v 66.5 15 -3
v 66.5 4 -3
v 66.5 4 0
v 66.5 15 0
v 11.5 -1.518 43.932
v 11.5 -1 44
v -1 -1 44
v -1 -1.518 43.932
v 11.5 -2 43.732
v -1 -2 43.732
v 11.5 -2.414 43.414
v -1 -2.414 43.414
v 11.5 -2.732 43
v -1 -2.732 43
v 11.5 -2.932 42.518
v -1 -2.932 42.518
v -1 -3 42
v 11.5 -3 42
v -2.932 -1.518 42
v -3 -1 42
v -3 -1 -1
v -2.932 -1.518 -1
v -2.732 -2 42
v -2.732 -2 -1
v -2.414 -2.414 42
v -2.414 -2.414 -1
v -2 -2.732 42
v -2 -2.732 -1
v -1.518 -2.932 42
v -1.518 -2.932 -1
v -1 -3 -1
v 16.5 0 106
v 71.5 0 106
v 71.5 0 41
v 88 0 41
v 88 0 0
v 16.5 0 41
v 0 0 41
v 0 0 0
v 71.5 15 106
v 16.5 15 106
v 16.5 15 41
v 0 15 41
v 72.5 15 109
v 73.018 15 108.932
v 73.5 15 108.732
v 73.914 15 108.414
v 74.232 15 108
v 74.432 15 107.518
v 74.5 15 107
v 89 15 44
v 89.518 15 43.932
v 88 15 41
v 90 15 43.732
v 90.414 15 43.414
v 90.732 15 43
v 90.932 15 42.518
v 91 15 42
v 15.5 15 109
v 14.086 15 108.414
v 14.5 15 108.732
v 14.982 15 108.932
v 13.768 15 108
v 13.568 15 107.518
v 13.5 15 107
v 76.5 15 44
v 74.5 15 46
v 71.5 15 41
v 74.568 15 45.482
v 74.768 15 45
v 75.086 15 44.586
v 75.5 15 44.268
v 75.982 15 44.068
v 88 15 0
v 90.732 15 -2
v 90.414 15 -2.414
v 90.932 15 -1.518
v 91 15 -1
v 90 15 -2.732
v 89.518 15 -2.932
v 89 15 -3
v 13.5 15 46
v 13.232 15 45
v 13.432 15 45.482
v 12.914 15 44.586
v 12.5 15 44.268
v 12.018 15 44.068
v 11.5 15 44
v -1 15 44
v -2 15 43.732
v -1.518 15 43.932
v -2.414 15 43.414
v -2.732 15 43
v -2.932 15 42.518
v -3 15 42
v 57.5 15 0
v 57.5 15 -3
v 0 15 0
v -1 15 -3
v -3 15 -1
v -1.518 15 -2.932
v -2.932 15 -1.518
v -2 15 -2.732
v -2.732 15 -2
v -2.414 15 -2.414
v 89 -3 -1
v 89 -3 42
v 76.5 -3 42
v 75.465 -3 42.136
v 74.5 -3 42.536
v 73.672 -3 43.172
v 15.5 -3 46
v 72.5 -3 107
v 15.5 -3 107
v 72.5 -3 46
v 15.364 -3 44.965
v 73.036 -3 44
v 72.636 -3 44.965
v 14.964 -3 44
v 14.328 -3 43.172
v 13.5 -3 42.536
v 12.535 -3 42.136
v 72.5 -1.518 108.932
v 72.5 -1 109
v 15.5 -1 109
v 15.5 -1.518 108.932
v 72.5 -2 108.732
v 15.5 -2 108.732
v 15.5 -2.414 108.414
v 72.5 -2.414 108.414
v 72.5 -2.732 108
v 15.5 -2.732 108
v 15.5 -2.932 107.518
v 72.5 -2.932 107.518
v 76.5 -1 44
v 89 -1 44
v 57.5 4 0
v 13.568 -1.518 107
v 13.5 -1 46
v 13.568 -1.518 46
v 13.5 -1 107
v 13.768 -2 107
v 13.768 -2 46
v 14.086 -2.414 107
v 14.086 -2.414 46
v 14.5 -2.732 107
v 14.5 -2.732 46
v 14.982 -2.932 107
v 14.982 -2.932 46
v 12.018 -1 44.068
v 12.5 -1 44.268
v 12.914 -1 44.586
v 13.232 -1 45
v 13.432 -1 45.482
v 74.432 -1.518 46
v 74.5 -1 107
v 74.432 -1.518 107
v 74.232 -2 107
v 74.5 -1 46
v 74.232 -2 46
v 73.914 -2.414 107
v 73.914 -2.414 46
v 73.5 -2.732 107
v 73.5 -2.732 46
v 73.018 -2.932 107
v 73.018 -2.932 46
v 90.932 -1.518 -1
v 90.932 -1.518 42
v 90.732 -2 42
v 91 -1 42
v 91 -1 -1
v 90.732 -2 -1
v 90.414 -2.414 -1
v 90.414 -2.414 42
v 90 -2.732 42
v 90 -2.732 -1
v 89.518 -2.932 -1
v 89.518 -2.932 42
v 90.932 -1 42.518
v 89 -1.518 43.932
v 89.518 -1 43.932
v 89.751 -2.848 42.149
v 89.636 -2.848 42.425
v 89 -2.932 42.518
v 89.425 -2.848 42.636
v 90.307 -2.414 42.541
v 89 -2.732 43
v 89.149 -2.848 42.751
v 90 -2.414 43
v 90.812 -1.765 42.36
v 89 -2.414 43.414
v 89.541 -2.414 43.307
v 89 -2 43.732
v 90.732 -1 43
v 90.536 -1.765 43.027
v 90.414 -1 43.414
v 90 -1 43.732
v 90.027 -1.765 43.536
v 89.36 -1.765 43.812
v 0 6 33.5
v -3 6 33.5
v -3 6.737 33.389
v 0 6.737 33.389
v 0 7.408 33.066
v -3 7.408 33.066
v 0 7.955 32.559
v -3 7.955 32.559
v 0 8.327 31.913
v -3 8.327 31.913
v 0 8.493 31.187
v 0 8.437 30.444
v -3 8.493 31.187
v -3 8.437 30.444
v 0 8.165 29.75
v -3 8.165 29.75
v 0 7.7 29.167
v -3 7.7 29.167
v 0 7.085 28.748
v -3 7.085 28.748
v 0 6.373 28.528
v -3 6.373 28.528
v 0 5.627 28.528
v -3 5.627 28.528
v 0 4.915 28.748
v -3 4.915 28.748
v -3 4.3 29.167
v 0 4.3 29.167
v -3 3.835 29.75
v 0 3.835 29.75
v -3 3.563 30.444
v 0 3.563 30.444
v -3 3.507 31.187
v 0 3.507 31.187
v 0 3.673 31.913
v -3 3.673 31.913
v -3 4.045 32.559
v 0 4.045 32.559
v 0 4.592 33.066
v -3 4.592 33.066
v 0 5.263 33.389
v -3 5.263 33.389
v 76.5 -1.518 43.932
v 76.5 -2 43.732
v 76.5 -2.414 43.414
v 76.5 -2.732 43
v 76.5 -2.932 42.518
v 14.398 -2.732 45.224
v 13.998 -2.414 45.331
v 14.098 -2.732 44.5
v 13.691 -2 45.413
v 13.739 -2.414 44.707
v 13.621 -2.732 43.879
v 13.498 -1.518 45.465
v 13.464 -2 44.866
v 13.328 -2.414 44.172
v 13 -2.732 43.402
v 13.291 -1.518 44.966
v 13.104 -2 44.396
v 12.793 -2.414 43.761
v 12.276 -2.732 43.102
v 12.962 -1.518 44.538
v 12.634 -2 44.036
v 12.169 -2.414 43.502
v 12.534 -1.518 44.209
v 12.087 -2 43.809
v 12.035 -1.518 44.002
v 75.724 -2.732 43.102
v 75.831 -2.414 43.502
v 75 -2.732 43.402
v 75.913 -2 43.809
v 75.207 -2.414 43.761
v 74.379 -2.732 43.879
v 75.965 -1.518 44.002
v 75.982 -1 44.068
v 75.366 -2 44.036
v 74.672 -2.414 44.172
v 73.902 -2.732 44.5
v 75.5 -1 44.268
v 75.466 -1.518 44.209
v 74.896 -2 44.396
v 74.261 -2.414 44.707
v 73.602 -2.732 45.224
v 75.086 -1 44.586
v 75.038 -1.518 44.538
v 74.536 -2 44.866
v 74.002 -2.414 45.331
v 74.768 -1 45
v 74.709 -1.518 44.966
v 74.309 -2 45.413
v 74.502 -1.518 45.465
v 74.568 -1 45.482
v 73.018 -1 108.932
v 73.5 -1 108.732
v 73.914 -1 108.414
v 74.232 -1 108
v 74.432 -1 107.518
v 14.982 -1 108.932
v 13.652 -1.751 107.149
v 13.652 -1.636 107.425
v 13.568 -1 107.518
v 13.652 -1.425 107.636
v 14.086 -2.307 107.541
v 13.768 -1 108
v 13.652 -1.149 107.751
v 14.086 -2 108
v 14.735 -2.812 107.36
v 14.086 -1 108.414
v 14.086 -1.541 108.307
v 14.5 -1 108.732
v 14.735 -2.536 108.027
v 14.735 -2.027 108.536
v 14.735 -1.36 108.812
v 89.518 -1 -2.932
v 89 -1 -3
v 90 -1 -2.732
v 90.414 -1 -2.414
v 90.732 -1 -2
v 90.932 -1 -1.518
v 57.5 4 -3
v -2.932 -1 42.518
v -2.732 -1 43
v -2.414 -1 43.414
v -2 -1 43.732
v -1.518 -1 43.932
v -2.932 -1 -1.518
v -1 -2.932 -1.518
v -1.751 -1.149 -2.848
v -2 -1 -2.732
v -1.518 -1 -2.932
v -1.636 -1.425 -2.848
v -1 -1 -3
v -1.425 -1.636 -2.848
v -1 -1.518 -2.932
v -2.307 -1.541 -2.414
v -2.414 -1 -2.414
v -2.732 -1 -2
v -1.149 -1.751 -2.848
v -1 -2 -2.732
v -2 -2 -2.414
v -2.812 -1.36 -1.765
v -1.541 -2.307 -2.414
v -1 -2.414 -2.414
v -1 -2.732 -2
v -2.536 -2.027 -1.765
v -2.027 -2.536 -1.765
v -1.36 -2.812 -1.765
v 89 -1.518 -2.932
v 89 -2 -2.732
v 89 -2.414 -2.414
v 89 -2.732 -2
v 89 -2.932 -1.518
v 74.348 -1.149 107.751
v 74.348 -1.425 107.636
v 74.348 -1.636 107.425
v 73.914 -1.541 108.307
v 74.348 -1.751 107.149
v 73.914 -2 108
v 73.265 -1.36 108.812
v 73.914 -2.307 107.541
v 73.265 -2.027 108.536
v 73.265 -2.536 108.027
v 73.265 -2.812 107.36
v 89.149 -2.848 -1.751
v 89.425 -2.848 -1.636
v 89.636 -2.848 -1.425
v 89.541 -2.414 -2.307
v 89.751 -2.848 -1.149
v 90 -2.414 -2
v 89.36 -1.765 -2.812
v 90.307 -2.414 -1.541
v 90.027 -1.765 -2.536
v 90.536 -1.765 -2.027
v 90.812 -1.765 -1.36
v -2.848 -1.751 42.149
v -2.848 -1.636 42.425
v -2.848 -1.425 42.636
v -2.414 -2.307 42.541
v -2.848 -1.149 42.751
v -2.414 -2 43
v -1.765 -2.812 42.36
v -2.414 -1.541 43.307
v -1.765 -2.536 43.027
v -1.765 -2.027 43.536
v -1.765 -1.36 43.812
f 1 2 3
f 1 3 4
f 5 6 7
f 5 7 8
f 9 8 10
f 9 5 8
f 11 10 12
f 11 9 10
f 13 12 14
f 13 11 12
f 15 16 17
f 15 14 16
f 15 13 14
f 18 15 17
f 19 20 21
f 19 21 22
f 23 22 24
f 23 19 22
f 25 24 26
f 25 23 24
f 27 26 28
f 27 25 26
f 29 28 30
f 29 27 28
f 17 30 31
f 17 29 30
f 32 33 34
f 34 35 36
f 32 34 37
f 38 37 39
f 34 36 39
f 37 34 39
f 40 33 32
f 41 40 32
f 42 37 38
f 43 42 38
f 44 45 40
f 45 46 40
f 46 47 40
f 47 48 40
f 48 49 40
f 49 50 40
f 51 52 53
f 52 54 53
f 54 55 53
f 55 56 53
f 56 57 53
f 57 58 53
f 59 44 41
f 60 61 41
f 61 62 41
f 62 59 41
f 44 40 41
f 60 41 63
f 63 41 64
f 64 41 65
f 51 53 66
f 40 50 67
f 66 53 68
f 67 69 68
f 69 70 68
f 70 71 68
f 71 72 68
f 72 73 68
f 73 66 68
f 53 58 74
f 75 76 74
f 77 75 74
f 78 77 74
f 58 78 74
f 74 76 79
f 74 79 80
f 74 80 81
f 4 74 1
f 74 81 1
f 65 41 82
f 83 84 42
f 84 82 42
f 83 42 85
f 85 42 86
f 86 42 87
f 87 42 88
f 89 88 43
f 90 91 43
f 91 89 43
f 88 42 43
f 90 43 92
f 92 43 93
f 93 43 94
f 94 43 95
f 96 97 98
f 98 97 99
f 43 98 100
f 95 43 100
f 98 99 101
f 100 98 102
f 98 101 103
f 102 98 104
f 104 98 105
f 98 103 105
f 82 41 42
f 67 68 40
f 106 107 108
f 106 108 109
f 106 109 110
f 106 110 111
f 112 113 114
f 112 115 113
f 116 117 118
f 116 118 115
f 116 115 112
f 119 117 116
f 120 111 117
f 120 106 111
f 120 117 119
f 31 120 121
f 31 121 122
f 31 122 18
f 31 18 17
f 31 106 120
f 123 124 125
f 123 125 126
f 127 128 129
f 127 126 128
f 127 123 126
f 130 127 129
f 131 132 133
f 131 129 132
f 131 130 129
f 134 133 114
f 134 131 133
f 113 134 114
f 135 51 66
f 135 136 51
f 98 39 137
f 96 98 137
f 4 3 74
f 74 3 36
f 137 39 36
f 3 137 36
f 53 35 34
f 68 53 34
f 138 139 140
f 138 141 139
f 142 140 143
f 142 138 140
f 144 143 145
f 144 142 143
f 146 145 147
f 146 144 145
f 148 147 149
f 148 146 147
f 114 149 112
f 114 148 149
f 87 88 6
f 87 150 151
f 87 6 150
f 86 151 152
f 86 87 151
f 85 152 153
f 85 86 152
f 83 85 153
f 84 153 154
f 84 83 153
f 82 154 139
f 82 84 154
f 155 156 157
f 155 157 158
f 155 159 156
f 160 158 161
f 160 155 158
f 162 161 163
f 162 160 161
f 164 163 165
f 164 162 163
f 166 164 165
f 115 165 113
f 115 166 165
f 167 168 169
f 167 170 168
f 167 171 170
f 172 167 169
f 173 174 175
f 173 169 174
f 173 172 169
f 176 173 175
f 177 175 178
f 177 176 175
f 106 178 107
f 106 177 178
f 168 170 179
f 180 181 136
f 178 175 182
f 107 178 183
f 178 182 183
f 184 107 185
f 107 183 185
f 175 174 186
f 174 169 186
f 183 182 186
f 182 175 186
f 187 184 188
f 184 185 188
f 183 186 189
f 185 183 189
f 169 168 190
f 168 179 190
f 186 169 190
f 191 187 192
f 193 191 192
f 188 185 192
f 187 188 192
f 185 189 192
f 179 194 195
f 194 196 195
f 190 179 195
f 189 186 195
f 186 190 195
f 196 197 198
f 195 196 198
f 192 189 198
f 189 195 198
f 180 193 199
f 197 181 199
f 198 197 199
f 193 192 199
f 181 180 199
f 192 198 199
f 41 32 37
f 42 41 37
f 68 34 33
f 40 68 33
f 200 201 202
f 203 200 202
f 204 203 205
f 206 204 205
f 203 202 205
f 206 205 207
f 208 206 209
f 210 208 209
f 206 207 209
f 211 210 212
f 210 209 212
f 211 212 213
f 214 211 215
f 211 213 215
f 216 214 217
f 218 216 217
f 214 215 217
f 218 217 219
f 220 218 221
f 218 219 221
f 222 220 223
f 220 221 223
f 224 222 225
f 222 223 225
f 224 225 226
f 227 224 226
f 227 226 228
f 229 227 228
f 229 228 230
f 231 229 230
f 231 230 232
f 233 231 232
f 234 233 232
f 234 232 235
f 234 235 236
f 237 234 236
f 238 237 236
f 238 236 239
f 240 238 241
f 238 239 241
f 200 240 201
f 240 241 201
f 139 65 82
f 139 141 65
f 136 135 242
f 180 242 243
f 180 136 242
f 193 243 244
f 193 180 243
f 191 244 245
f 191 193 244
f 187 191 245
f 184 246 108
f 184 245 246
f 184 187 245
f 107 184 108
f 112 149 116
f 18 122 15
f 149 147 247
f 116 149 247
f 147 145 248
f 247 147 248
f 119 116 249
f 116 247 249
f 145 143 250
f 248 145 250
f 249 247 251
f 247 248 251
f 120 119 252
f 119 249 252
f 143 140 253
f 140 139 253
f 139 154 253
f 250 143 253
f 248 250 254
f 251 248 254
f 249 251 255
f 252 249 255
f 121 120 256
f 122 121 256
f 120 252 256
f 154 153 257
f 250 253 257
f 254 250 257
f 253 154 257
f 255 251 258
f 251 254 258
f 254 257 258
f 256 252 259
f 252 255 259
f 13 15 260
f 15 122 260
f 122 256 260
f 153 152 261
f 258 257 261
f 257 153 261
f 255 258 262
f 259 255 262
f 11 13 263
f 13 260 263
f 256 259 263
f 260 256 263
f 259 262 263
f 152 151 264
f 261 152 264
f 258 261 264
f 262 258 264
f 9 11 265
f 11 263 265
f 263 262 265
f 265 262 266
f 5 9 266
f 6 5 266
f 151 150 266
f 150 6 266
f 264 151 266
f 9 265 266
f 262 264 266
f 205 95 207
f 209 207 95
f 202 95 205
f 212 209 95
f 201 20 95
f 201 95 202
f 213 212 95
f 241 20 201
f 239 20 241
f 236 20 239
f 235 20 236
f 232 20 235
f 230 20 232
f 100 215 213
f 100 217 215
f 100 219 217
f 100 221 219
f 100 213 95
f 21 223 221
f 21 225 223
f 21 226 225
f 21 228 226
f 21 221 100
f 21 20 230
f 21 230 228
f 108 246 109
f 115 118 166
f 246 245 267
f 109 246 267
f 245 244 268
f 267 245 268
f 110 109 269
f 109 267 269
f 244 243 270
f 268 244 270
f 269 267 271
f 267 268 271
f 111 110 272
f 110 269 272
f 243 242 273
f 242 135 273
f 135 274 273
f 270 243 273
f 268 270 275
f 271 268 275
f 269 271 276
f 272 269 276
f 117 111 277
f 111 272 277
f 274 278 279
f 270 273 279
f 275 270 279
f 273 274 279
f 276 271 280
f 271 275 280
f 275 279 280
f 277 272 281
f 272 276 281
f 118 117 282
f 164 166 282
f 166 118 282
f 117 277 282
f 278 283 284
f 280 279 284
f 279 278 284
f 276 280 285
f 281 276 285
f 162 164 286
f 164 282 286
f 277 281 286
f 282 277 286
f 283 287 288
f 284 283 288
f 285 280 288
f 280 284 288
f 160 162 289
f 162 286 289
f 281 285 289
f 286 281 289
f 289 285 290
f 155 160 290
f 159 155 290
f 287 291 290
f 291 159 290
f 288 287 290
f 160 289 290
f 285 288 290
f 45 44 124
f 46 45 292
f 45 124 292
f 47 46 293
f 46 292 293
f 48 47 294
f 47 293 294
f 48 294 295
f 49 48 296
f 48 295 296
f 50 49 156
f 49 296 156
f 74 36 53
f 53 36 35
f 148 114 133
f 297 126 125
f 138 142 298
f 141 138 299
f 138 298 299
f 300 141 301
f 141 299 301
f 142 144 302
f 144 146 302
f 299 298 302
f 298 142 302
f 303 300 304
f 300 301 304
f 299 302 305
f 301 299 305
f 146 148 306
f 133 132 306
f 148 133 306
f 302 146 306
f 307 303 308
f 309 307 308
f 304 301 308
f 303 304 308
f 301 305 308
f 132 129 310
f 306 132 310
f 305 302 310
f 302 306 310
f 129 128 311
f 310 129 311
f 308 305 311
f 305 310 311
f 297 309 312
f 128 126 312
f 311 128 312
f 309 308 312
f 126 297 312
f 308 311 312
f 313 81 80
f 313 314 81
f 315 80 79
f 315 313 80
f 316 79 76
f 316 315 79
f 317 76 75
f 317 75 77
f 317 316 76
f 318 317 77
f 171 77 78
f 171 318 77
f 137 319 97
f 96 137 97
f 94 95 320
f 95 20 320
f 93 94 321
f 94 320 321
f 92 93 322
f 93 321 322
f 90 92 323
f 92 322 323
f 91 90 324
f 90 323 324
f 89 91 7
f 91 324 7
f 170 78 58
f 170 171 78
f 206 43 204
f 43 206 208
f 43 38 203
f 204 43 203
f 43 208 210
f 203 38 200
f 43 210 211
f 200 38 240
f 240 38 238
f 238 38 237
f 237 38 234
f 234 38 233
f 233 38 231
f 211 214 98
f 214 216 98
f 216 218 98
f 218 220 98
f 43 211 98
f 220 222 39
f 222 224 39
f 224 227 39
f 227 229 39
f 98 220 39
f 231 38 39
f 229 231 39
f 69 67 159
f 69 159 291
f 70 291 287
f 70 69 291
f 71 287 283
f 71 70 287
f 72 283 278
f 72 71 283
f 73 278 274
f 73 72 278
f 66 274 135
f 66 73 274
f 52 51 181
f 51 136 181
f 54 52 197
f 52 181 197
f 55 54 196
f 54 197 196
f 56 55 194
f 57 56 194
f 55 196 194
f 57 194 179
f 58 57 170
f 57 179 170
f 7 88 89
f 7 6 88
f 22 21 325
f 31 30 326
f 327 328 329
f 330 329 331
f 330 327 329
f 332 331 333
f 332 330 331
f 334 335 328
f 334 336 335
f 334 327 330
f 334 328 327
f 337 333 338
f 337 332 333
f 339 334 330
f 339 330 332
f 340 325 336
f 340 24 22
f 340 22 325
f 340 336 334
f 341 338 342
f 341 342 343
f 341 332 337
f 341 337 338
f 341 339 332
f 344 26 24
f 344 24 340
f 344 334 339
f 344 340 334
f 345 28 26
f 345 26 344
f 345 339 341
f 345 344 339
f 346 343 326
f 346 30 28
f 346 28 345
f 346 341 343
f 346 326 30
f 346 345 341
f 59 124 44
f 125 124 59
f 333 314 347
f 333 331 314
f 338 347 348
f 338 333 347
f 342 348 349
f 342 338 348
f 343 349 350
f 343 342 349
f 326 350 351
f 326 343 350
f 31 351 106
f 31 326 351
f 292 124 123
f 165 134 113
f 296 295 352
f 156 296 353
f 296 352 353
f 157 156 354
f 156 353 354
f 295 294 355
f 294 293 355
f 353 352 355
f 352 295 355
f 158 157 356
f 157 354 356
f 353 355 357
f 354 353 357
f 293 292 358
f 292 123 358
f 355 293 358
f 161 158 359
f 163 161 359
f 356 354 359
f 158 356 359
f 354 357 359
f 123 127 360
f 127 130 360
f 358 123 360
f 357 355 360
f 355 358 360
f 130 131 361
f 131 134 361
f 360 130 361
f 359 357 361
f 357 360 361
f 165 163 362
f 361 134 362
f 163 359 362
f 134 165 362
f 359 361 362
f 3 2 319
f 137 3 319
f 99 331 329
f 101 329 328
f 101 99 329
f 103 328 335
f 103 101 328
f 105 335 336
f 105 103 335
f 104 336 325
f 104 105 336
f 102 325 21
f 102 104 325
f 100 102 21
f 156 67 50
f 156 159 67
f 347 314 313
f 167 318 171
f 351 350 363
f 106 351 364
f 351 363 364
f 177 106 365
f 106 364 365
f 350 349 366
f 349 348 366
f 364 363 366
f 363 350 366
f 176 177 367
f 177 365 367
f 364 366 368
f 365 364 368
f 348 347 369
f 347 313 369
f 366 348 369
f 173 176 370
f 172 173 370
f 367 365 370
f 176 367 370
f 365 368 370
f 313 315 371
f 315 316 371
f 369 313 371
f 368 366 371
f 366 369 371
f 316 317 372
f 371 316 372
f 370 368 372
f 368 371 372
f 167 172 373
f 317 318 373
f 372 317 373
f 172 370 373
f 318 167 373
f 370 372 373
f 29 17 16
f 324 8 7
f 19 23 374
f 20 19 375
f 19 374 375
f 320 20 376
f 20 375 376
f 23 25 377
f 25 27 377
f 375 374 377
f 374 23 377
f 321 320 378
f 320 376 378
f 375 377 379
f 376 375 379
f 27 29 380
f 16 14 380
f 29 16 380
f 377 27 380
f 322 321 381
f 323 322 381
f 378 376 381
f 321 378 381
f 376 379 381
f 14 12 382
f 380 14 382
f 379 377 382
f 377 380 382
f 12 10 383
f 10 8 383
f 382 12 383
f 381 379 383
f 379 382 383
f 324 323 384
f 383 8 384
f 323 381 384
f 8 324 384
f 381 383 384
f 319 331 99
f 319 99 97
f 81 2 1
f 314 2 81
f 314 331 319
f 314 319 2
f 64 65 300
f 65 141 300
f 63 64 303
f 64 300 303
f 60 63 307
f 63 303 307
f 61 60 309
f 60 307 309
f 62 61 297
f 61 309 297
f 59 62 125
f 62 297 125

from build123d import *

# Parameters (mm, degrees)
BOSS_EXTRUDE1_DEPTH = 15
SHELL1_T            = 3
SKETCH3_W           = 9
SKETCH3_H           = 11
CUT_EXTRUDE1_DEPTH  = 3
SKETCH4_R           = 2.5
CUT_EXTRUDE2_DEPTH  = 3
FILLET1_R           = 2


with BuildPart() as part:
    # Sketch1 → Boss-Extrude1 (new body)
    with BuildSketch(Plane(origin=(0, 0, 0), x_dir=(1, 0, 0), z_dir=(0, 1, 0))):
        Polygon((0, 0), (88, 0), (88, -41), (71.5, -41), (71.5, -106), (16.5, -106), (16.5, -41), (0, -41), align=None)
    extrude(amount=BOSS_EXTRUDE1_DEPTH)

    # Shell1
    shell1_openings = [part.faces().sort_by_distance(p)[0] for p in [
        (44, 15, 46.878254211),
    ]]
    offset(amount=SHELL1_T, openings=shell1_openings, kind=Kind.INTERSECTION)

    # Sketch3 → Cut-Extrude1 (cut)
    with BuildSketch(Plane(origin=(0, 0, -3), x_dir=(-1, 0, 0), z_dir=(0, 0, -1))):
        with Locations((-62, 9.5)):
            Rectangle(SKETCH3_W, SKETCH3_H)
    extrude(amount=-CUT_EXTRUDE1_DEPTH, mode=Mode.SUBTRACT)

    # Sketch4 → Cut-Extrude2 (cut)
    with BuildSketch(Plane.ZY.offset(3)):
        with Locations((31, 6)):
            Circle(SKETCH4_R)
    extrude(amount=-CUT_EXTRUDE2_DEPTH, mode=Mode.SUBTRACT)

    # Fillet1
    fillet1_edges = [part.edges().sort_by_distance(p)[0] for p in [
        (44, -3, 109),
        (13.5, -3, 76.5),
        (5.25, -3, 44),
        (-3, -3, 20.5),
        (-3, 6, -3),
        (91, 6, -3),
        (91, 6, 44),
        (74.5, 6, 44),
        (74.5, 6, 109),
        (13.5, 6, 109),
        (13.5, 6, 44),
        (-3, 6, 44),
        (44, -3, -3),
        (91, -3, 20.5),
        (82.75, -3, 44),
        (74.5, -3, 76.5),
    ]]
    fillet(fillet1_edges, radius=FILLET1_R)


solid = part.part
